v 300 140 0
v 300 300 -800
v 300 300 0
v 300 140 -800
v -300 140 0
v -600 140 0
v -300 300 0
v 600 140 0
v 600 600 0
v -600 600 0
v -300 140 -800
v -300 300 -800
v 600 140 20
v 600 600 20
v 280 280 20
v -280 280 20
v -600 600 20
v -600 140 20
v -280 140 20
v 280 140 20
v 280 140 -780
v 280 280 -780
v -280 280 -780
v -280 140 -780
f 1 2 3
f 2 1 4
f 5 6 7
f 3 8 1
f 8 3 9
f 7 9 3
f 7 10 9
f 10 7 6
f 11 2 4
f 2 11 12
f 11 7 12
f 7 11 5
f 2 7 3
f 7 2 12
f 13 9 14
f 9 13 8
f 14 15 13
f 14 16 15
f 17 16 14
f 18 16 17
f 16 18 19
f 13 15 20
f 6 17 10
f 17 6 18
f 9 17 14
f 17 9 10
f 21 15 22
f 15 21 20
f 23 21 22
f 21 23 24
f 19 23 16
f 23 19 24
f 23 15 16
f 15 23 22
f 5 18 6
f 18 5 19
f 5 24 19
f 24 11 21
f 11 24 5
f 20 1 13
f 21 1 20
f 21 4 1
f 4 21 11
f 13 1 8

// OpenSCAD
width=600;
depth=800;
wall_thickness=20;
flange=300;


module afstapje(
    w=width,
    d=depth,
    wt=wall_thickness,
    f=flange,
){
    module box() {
        difference() {
            union() {
                    translate([0,0,d/-2]) cube([w,w,d],true); 
                    translate([0,0,(wt)/2]) cube([w+2*f,w+2*f,wt],true); 
                }
                translate([0,0,1.5*wt-d/2]) cube([w-2*wt,w-2*wt,d+wt],true); 
            }
     }
        difference() {
   
        box();
        translate([0,-(w+d)/2,0])  cube([2.1*d,2.1*d,2.1*d],true);
    
}
   } 
afstapje();
